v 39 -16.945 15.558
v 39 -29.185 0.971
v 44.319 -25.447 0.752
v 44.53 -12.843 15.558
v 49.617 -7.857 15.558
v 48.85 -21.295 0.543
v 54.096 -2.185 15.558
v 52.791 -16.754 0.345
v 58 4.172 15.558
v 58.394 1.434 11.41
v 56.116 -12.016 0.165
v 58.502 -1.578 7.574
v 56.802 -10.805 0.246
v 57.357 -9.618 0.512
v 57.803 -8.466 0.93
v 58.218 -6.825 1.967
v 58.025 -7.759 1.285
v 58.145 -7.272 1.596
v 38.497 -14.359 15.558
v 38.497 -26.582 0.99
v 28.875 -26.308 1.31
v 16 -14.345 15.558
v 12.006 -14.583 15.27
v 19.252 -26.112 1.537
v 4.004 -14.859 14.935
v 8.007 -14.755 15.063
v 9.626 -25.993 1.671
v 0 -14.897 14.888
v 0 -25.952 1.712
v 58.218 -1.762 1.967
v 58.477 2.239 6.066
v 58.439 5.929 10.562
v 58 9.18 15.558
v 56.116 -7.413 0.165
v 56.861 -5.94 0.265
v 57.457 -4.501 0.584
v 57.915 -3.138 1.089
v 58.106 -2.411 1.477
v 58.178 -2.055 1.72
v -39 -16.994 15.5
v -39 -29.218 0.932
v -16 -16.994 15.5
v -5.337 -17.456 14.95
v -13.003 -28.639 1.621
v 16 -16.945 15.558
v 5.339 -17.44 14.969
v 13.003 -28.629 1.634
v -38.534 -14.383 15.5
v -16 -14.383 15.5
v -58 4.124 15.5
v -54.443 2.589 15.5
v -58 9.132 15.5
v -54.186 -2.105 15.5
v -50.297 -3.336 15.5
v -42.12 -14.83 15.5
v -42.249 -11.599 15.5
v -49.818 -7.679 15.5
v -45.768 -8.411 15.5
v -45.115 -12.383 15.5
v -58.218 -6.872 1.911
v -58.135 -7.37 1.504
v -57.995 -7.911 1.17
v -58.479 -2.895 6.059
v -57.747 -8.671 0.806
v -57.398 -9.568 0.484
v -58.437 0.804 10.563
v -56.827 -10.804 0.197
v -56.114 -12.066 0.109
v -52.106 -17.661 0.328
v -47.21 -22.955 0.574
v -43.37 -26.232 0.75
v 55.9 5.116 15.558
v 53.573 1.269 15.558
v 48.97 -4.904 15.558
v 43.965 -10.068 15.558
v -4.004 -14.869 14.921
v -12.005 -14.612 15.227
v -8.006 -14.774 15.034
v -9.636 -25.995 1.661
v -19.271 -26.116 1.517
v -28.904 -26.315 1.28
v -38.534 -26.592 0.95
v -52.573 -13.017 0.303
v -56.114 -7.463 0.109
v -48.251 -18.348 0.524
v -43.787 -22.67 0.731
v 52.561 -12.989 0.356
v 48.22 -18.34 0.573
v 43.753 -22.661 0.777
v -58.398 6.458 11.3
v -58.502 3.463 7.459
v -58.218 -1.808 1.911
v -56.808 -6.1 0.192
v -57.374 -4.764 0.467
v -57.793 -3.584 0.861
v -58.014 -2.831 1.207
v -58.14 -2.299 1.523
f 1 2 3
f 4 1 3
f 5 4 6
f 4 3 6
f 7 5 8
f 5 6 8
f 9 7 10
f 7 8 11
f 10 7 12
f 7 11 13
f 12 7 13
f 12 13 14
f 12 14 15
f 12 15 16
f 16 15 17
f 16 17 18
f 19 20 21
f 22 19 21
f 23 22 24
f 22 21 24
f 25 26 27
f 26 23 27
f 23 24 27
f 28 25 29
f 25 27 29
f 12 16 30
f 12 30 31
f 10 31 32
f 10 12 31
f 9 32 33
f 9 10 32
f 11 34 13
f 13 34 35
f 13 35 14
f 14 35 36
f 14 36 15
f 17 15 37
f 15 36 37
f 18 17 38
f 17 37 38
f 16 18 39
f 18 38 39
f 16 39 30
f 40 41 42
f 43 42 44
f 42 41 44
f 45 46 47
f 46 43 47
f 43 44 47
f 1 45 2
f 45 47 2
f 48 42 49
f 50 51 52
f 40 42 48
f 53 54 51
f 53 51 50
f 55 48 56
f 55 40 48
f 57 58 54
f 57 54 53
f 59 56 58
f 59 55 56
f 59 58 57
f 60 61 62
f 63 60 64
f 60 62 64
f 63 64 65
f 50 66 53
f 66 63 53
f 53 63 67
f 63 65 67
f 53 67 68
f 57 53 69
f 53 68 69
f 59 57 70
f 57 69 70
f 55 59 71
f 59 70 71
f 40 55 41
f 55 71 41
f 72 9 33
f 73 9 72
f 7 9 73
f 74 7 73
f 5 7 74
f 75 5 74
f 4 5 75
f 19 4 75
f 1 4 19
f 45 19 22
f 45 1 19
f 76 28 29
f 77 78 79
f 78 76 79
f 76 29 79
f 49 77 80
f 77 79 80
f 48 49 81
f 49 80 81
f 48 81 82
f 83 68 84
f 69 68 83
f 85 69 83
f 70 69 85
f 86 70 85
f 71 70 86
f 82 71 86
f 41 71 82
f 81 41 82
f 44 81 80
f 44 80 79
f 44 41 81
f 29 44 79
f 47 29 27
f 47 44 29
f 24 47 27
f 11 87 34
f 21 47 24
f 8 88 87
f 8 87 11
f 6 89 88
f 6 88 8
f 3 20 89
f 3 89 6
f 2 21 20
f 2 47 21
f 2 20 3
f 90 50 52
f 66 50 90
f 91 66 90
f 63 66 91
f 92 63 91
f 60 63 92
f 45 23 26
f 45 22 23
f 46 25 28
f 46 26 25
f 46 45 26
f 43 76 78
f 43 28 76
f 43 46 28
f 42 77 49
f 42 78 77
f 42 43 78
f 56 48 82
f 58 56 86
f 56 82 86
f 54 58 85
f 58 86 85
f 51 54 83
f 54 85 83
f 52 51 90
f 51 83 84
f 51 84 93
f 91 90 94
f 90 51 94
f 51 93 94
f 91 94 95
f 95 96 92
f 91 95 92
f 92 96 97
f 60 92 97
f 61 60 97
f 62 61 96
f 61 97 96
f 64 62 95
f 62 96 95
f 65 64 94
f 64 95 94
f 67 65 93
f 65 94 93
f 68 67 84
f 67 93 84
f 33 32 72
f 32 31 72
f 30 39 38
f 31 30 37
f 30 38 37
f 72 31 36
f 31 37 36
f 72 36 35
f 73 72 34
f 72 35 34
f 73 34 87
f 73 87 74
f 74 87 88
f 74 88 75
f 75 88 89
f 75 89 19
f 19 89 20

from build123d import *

# Parameters (mm, degrees)
F1_DEPTH      = 40
F1_DEPTH_BACK = 11
F4_DEPTH      = 35
F4_DEPTH_BACK = 27.9057510197
F5_T1_DEPTH   = 14.6143927182
F5_T3_DEPTH   = 14.6250082056


# Not quite as in the source:
# - a fillet or chamfer that OpenCascade refuses, or shapes differently, is made with other operations: its cross-section is extruded or revolved along the edge and cut away or added


with BuildPart() as f1:
    # F0 (on Front) → F1 (new body, two sides)
    with BuildSketch(Plane.XZ) as f1_sk:
        with BuildLine():
            Line((-16, 15.5), (-58, 15.5))
            ThreePointArc((-58, 15.5), (-58.5026261084, 7.75), (-58, 0))
            ThreePointArc((-58, 0), (-0.000843128, 1.7124660629), (58, 0.0580978101))
            ThreePointArc((58, 0.0580978101), (58.5026261084, 7.8080978101), (58, 15.5580978101))
            Line((58, 15.5580978101), (16, 15.5580978101))
            ThreePointArc((16, 15.5580978101), (0.0011638232, 14.8880205552), (-16, 15.5))
        make_face()
    extrude(amount=F1_DEPTH)
    extrude(f1_sk.sketch, amount=-F1_DEPTH_BACK)

    # F3 (on face) → F4 (cut, two sides)
    with BuildSketch(Plane(origin=(0, -8.8661687739, -10.5662884888), x_dir=(1, 0, 0), z_dir=(0, -0.6427876097, -0.7660444431))) as f4_sk:
        with BuildLine():
            Line((38.4965417924, 21), (0, 20.9813332936))
            Line((0, 20.9813332936), (-38.534011751, 20.9813332936))
            ThreePointArc((-38.534011751, 20.9813332936), (-51.7445439017, 11.0585633209), (-61, -2.6277822851))
            Line((-61, -2.6277822851), (-61, -10.626510717))
            Line((-61, -10.626510717), (-61, -28.2158330083))
            Line((-61, -28.2158330083), (0, -28.2158330083))
            Line((0, -28.2158330083), (61, -28.2158330083))
            Line((61, -28.2158330083), (61, -12.4673116952))
            Line((61, -12.4673116952), (61, -2.6264255467))
            ThreePointArc((61, -2.6264255467), (51.7297238243, 11.0740614176), (38.4965417924, 21))
        make_face()
        with BuildLine():
            Line((61, 1.9813332936), (61, 22.9813332936))
            Line((61, 22.9813332936), (61, 52.9813332936))
            Line((61, 52.9813332936), (-61, 52.9813332936))
            Line((-61, 52.9813332936), (-61, 22.9813332936))
            Line((-61, 22.9813332936), (-61, 1.9813332936))
            ThreePointArc((-61, 1.9813332936), (-51.6354627813, 14.1946752549), (-39, 22.9813332936))
            Line((-39, 22.9813332936), (39, 22.9813332936))
            ThreePointArc((39, 22.9813332936), (51.6354627813, 14.1946752549), (61, 1.9813332936))
        make_face()
    extrude(amount=-F4_DEPTH, mode=Mode.SUBTRACT)
    extrude(f4_sk.sketch, amount=F4_DEPTH_BACK, mode=Mode.SUBTRACT)

    # F5: fillet of radius 2 on 2 edges, made by hand

    # F5_s2 → F5_t1 (cut)
    with BuildSketch(Plane.XZ.offset(-0.9773730981)):
        with BuildLine():
            ThreePointArc((56.1159001591, 0.164829526), (57.5290135561, 0.6434770054), (58.2176321612, 1.9670318018))
            ThreePointArc((58.2176321612, 1.9670318018), (58.1164574753, 1.0116936322), (58, 0.0580978101))
            ThreePointArc((58, 0.0580978101), (57.0579752565, 0.1119081086), (56.1159001591, 0.164829526))
        make_face()
    extrude(amount=F5_T1_DEPTH, mode=Mode.SUBTRACT)

    # F5_s4 → F5_t3 (cut)
    with BuildSketch(Plane.XZ.offset(-0.9343439765)):
        with BuildLine():
            ThreePointArc((-58.2178227579, 1.9108828482), (-57.5284634735, 0.5866337247), (-56.1140880268, 0.1087278139))
            ThreePointArc((-56.1140880268, 0.1087278139), (-57.0570696874, 0.0548092283), (-58, 0))
            ThreePointArc((-58, 0), (-58.1165683708, 0.9545685987), (-58.2178227579, 1.9108828482))
        make_face()
    extrude(amount=F5_T3_DEPTH, mode=Mode.SUBTRACT)


solid = f1.part
